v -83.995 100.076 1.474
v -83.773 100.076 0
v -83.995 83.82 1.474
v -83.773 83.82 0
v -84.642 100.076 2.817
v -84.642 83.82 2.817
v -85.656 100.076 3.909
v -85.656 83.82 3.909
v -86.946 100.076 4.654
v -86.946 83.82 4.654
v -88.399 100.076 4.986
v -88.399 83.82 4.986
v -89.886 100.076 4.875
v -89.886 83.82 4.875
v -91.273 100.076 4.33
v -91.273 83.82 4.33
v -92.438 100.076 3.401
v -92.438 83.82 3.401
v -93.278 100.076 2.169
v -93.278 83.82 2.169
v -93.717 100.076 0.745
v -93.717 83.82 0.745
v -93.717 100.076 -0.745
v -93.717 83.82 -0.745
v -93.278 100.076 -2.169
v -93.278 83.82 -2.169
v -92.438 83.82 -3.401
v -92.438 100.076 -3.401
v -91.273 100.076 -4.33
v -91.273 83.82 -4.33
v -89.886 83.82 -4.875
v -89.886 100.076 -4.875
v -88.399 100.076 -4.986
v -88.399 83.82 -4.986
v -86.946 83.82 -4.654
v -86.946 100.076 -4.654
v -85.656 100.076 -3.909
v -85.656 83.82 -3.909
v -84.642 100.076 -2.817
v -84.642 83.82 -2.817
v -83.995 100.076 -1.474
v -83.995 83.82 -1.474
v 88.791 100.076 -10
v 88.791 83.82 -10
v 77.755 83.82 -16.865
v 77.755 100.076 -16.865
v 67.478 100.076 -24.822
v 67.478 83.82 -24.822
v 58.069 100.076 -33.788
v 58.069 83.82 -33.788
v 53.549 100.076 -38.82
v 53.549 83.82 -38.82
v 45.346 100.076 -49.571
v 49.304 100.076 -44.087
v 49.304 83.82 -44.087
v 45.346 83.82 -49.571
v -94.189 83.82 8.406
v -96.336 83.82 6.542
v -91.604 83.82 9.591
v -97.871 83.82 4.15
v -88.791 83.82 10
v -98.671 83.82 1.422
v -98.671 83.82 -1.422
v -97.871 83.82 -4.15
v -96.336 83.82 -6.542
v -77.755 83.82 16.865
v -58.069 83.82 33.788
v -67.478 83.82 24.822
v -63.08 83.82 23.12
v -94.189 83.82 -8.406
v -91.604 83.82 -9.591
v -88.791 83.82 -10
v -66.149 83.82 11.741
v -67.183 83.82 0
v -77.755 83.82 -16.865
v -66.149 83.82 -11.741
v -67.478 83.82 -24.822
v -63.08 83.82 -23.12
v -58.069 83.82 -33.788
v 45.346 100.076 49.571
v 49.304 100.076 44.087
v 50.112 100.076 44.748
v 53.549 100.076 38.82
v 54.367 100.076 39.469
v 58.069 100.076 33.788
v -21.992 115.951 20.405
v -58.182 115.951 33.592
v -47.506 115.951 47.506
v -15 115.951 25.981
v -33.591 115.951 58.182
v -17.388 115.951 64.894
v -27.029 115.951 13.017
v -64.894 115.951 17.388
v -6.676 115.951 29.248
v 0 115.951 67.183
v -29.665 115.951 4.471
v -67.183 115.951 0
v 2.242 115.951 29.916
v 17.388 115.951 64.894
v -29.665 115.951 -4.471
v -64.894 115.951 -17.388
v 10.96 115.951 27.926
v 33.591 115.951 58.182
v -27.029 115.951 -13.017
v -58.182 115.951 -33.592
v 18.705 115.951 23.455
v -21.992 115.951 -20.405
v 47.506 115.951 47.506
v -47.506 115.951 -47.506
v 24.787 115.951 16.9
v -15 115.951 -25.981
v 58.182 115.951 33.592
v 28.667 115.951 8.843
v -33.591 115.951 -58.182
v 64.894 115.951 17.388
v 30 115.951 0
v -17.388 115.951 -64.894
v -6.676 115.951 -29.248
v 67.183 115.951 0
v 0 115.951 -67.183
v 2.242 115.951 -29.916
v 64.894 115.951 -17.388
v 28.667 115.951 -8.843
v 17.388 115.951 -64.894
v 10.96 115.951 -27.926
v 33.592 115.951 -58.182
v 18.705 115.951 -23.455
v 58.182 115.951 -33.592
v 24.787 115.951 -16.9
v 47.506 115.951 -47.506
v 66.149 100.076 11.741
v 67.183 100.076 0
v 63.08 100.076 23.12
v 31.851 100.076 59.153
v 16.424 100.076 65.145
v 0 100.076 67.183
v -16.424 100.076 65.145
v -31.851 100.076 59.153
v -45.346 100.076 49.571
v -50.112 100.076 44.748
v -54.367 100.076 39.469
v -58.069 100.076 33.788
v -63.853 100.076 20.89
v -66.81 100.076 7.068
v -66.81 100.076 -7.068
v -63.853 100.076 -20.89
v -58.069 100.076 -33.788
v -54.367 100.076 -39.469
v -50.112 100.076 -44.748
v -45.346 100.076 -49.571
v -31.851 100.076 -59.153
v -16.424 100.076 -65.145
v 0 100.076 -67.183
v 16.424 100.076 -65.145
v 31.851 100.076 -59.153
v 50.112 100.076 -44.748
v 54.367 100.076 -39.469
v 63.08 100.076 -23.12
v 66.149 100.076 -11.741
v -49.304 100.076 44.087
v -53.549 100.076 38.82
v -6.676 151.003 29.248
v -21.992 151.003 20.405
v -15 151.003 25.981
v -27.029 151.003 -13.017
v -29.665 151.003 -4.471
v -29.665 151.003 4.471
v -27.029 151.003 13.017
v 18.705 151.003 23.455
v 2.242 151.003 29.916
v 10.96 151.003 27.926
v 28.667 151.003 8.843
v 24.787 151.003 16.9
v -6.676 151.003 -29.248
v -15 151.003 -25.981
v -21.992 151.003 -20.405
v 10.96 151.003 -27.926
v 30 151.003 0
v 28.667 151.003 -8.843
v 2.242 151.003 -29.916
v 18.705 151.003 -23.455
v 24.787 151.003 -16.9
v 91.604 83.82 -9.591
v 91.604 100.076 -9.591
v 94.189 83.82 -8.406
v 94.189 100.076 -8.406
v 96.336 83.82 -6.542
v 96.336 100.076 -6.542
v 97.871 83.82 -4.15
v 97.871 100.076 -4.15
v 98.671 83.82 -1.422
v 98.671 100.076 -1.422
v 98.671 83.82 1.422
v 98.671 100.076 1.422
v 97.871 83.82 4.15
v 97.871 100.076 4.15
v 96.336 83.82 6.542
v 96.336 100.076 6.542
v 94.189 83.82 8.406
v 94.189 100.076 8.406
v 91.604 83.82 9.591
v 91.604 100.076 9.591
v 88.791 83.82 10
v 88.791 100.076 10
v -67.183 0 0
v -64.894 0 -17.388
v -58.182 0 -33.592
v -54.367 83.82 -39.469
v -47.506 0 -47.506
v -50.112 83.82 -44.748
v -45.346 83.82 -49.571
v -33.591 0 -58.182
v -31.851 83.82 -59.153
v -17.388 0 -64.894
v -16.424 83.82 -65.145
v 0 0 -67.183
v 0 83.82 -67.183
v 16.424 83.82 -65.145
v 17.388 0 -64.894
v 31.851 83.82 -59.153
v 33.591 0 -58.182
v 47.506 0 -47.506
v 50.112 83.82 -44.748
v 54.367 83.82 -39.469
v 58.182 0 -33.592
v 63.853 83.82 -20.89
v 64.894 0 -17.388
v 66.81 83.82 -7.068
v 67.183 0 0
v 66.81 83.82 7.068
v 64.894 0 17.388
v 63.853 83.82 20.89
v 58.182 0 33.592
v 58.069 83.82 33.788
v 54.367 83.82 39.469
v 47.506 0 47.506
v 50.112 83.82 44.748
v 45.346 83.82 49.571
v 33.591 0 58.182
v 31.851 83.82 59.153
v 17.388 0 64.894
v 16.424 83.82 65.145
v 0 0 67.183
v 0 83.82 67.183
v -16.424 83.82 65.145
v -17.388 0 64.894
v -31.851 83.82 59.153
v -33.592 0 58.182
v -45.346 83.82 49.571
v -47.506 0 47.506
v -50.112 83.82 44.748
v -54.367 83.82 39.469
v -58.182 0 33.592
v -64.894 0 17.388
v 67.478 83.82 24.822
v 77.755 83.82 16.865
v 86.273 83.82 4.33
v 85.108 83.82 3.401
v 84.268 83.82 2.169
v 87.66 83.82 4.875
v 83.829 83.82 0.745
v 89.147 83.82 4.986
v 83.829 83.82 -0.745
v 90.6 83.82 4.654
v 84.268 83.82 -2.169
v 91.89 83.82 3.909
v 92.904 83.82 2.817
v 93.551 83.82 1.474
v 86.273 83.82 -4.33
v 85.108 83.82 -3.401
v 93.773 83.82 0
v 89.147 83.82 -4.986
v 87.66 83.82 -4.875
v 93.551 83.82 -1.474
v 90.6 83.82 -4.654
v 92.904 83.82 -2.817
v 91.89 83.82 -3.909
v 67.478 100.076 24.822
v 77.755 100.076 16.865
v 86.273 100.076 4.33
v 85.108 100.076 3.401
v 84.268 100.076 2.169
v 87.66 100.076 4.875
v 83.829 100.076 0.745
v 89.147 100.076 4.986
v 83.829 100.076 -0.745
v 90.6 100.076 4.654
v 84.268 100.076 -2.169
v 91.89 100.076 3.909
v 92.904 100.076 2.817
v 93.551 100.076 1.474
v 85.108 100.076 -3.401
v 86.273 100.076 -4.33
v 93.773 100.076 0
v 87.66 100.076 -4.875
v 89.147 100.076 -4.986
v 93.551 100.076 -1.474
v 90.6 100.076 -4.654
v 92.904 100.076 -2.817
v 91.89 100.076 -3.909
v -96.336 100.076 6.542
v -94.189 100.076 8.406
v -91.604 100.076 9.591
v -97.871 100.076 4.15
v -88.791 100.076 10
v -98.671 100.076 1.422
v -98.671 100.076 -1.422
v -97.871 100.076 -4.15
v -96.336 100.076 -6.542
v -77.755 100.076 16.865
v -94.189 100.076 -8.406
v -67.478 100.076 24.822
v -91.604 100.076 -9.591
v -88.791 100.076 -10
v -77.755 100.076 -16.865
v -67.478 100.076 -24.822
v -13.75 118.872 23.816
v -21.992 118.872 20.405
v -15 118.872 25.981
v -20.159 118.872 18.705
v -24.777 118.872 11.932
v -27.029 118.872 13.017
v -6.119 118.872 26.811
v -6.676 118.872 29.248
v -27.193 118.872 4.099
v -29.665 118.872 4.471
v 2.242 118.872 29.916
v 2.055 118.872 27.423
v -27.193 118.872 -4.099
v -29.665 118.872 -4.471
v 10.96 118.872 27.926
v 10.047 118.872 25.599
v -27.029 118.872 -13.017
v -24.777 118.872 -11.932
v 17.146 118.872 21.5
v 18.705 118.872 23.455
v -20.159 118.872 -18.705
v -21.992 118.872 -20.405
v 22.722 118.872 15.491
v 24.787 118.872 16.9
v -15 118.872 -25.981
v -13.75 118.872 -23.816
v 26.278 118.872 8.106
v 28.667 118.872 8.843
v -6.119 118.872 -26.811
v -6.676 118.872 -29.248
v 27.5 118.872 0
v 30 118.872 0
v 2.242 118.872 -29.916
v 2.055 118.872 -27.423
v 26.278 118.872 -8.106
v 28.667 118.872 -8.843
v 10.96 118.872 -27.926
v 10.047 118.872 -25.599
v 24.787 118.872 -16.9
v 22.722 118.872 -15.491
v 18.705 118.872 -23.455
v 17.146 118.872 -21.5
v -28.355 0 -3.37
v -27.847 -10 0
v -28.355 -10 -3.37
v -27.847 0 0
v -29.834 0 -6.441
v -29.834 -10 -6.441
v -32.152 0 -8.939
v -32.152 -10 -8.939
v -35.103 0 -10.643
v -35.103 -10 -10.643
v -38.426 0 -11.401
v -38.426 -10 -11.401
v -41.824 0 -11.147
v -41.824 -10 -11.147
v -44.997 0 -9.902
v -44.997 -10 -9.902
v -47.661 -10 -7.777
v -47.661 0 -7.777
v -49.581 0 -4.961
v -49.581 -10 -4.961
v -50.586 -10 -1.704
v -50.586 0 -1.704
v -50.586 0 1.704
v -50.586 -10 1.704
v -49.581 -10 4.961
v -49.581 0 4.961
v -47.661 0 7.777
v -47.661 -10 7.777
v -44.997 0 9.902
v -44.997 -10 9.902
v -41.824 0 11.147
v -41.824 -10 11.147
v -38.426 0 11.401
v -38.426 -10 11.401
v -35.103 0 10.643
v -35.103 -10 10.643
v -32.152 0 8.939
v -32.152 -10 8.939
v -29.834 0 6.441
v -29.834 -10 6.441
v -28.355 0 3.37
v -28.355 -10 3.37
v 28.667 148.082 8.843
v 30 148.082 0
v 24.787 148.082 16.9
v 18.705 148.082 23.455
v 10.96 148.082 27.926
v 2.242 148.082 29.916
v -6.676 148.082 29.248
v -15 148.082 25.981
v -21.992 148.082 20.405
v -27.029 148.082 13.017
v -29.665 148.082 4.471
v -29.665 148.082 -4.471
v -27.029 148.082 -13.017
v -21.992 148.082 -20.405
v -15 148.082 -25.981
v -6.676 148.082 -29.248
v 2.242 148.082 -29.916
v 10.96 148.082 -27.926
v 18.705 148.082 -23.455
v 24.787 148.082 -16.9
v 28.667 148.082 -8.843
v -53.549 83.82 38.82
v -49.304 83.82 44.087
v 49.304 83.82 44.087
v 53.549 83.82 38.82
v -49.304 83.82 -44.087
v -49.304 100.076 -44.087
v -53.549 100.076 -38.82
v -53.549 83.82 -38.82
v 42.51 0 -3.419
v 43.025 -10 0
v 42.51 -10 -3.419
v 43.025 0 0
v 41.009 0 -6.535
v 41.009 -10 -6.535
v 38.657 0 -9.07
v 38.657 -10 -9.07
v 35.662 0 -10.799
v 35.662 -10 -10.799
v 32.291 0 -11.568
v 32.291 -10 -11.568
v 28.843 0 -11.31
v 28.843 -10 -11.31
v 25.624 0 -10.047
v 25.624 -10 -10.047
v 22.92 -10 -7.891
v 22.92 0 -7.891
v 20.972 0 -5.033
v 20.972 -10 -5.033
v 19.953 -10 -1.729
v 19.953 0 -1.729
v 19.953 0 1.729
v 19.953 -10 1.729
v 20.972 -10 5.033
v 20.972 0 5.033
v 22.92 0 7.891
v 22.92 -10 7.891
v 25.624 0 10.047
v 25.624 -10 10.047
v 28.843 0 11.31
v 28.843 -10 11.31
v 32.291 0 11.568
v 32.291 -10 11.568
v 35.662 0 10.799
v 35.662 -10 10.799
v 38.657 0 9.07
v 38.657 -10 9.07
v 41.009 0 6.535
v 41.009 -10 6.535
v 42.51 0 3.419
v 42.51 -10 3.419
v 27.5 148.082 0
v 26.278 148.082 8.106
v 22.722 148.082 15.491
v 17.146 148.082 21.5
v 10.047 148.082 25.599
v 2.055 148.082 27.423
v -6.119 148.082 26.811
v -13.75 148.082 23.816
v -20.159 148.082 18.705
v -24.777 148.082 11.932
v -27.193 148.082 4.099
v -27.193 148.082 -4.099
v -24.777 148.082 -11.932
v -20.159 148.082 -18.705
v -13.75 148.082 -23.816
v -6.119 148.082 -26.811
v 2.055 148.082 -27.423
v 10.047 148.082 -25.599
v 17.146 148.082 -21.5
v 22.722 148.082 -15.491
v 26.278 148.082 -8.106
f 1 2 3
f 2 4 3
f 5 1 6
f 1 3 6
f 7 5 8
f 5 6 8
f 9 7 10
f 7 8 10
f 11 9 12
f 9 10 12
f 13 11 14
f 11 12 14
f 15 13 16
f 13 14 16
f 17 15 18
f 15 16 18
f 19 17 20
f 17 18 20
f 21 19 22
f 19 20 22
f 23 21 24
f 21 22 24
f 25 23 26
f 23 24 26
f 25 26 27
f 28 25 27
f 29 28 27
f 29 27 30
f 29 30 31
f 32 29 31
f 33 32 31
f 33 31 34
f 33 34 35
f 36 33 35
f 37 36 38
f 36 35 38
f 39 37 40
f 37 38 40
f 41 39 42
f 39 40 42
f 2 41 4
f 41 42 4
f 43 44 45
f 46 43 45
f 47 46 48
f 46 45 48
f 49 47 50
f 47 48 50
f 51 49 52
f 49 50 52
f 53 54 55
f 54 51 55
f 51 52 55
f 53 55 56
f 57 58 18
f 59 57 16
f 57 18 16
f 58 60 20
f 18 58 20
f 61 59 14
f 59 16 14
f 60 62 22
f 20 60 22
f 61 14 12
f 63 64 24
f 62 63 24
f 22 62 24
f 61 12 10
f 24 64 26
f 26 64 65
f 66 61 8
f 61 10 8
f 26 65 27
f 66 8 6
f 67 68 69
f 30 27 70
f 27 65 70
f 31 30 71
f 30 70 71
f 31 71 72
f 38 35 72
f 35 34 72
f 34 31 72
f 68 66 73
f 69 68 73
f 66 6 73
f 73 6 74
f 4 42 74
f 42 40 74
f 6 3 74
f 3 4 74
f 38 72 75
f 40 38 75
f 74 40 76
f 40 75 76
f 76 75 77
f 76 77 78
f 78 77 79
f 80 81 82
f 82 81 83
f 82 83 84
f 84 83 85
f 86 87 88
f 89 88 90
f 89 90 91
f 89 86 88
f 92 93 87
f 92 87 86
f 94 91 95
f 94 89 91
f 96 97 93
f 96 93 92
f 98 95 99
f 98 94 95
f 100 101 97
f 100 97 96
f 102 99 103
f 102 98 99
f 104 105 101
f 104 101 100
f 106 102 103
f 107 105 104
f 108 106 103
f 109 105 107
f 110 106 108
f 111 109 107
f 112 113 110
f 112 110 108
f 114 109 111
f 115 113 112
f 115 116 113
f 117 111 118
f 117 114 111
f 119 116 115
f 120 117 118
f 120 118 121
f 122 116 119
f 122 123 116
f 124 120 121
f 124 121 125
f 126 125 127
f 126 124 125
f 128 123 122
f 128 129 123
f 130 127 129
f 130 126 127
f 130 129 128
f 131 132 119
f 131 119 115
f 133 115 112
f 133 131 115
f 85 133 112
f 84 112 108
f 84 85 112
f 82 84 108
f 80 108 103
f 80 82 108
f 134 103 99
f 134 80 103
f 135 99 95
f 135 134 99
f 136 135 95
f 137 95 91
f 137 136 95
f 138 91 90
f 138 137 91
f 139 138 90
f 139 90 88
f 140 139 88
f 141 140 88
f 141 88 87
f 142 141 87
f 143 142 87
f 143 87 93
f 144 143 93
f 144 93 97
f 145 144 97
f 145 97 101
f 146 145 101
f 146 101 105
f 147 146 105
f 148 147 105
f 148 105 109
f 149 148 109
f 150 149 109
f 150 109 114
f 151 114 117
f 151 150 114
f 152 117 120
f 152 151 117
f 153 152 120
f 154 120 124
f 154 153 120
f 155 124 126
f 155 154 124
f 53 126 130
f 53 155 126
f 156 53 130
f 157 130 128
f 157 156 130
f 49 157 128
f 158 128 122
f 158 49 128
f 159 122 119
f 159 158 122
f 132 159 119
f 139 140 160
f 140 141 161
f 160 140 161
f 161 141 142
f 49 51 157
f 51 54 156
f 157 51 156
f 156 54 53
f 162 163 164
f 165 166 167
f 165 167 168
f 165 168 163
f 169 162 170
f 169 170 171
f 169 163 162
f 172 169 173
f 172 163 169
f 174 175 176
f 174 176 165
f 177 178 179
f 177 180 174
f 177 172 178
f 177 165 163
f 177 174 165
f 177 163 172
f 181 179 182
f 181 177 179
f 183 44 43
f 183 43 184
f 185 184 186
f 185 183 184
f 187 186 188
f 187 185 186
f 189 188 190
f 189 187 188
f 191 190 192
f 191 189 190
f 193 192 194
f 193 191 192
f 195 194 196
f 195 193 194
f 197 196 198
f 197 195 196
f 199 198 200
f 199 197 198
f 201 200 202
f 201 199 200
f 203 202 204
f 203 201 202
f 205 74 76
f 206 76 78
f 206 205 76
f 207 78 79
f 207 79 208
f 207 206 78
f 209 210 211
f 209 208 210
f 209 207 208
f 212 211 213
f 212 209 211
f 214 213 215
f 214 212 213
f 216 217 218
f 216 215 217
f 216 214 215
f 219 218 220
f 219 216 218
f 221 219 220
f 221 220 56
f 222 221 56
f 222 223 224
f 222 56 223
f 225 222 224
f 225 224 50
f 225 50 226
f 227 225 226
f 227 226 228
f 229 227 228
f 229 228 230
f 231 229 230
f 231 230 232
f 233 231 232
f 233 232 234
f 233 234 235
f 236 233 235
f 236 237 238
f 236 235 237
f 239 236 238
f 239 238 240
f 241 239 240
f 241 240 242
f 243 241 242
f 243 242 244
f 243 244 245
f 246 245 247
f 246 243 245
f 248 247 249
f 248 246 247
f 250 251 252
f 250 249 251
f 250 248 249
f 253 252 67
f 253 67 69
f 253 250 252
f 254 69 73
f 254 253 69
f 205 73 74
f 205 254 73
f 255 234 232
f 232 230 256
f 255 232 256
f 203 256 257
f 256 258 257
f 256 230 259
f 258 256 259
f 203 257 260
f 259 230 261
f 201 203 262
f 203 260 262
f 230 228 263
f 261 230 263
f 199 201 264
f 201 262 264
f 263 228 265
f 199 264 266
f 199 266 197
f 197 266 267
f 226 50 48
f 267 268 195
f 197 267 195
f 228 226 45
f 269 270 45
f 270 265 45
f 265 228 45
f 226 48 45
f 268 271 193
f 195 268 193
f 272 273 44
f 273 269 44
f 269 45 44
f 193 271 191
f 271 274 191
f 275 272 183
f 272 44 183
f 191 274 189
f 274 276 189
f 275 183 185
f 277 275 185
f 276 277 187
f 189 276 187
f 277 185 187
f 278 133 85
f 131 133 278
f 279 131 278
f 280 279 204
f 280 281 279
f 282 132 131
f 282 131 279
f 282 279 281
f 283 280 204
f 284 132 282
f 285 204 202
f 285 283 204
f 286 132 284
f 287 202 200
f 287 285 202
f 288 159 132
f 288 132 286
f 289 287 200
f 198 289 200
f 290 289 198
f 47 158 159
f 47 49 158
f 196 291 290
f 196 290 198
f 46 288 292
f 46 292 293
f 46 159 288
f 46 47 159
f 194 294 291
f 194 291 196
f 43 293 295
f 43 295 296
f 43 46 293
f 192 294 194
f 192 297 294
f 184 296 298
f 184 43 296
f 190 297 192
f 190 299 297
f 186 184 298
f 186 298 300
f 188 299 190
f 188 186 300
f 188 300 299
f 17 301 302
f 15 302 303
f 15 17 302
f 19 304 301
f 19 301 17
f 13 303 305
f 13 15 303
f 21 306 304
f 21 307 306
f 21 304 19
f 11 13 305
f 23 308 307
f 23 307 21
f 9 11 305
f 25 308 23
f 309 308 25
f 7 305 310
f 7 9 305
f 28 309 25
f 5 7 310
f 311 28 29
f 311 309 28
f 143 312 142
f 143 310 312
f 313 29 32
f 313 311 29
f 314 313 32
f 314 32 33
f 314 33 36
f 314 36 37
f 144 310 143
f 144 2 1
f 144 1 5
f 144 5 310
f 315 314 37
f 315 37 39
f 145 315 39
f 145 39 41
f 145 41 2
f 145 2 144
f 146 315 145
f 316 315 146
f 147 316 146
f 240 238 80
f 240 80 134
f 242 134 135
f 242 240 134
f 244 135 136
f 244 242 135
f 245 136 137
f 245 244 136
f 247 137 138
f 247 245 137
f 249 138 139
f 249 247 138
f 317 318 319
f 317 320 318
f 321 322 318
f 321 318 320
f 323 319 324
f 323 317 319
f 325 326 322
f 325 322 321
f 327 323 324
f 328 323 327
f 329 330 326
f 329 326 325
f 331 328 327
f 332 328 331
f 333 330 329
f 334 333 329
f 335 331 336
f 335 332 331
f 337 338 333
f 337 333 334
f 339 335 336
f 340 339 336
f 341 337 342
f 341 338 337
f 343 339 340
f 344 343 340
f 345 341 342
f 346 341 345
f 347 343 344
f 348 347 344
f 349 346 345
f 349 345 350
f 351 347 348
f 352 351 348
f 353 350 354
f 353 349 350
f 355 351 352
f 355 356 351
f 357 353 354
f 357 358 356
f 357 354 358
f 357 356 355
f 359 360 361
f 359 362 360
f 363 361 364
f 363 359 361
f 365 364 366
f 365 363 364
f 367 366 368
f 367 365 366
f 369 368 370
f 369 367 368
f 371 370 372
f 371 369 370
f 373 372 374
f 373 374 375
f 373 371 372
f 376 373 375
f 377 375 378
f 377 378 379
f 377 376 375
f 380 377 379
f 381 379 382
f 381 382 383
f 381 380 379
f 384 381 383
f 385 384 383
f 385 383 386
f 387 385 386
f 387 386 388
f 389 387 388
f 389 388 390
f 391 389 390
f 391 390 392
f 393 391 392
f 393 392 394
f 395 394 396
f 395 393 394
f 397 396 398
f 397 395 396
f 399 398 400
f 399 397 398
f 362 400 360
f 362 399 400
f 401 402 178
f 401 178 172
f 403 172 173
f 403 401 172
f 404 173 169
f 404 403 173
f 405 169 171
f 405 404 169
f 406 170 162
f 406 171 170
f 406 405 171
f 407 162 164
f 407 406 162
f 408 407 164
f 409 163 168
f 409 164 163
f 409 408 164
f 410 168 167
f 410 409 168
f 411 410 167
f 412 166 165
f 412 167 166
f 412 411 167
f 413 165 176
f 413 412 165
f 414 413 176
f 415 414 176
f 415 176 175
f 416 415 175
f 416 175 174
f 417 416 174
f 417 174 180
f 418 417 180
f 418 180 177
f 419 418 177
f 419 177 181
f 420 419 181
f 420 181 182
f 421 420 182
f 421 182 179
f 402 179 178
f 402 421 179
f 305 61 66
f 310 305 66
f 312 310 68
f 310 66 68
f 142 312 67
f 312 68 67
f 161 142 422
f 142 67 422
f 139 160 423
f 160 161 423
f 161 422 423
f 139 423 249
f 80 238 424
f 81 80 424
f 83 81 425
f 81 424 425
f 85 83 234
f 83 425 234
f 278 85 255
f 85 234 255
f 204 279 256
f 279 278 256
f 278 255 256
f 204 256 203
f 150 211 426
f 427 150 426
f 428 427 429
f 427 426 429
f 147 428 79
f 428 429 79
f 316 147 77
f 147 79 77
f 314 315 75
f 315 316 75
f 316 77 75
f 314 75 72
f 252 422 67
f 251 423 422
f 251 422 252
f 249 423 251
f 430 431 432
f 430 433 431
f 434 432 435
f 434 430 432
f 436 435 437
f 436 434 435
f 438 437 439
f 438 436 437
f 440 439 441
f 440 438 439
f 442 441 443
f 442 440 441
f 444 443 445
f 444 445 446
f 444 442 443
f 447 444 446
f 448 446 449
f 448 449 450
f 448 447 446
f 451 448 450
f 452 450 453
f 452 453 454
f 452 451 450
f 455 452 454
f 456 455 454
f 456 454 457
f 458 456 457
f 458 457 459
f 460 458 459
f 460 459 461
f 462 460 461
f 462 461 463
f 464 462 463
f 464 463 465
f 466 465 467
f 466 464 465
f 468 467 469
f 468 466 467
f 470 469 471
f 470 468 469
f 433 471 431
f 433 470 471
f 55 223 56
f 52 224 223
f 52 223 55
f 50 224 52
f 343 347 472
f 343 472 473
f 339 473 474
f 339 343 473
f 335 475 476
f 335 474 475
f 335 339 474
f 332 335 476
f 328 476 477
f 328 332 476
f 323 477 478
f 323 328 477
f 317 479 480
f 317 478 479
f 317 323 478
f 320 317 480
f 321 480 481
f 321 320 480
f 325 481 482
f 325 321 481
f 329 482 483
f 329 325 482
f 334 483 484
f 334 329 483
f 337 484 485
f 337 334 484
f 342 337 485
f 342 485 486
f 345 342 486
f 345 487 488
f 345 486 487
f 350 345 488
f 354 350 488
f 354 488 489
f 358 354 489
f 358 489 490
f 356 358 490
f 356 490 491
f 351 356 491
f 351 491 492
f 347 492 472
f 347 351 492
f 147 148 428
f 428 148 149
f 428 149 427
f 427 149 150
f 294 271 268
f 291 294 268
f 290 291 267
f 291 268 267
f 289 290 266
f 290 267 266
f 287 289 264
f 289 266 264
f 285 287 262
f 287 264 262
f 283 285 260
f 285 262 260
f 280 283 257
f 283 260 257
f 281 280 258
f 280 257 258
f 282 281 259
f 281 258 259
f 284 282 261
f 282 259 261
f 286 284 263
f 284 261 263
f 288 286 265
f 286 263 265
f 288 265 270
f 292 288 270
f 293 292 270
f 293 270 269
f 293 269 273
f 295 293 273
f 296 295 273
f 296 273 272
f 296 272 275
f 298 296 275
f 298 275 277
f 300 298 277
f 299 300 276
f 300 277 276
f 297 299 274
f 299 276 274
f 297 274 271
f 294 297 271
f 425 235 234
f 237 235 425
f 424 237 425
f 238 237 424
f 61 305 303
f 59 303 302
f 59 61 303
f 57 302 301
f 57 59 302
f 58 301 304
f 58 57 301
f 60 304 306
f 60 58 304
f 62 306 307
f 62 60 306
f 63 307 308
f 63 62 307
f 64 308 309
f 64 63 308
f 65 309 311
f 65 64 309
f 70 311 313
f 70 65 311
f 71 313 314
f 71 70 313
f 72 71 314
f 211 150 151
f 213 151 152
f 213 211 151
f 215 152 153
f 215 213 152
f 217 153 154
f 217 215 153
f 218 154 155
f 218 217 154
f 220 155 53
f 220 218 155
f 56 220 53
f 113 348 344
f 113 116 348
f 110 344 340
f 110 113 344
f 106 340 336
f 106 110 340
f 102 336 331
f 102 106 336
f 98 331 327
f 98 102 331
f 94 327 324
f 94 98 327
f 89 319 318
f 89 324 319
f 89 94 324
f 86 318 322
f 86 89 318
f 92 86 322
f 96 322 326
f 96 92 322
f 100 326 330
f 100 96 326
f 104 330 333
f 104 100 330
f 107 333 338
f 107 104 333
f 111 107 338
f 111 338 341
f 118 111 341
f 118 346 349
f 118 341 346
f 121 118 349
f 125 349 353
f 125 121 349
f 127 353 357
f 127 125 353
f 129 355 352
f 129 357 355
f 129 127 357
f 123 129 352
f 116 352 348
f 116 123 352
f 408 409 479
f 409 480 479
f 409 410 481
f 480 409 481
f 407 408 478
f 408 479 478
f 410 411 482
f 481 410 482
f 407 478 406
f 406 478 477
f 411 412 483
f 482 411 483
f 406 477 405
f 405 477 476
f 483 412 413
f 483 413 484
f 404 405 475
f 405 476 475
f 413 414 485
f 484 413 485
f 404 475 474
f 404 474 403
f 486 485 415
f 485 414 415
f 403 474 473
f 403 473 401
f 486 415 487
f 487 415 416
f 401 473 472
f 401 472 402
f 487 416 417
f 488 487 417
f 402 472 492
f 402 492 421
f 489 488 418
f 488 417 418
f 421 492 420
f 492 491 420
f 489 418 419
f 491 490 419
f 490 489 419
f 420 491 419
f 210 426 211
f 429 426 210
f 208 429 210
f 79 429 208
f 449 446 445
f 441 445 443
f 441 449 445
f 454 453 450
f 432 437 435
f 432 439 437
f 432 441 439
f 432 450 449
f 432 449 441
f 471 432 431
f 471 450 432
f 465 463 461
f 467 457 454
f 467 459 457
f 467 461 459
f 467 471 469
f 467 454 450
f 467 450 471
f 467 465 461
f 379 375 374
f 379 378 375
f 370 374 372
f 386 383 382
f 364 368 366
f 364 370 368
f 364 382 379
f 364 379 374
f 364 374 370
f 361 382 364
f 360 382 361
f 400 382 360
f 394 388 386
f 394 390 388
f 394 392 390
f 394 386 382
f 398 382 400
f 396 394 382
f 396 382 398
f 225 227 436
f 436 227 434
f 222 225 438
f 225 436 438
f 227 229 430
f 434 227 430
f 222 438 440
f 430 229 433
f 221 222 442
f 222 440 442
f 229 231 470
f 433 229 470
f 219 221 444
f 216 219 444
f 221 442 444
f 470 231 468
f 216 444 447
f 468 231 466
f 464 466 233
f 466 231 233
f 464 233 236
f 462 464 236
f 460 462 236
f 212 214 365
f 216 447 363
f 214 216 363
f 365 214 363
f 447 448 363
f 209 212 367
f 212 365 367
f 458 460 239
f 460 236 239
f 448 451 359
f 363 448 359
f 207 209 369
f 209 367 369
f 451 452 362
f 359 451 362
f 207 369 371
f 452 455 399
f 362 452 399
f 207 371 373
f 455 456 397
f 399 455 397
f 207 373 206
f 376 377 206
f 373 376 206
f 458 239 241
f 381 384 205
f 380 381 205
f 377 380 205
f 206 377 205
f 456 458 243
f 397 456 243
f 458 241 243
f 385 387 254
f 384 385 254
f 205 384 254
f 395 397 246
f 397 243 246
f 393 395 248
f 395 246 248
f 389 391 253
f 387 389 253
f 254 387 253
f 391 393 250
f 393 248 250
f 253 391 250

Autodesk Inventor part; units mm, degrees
ref_plane "YZ Plane" through (0, 0, 0) normal (1, 0, 0) x (0, 1, 0)
ref_plane "XZ Plane" through (0, 0, 0) normal (0, 1, 0) x (-1, 0, 0)
ref_plane "XY Plane" through (0, 0, 0) normal (0, 0, 1) x (1, 0, 0)
sketch "Sketch1" plane through (0, 0, 0) normal (0, 1, 0) x (-1, 0, 0)
  circle A0 centre (0, 0) radius 67.183
  dimension "d0" = 134.366
extrude "Extrusion1" add sketch "Sketch1" along normal blind 83.82
sketch "Sketch2" plane through (0, 83.82, 0) normal (0, 1, 0) x (1, 0, 0)
  arc A0 (-88.791, 10) -> (-88.791, -10) centre (-88.773, 0) ccw
  line L0 (0, 169.5617) -> (0, -169.5617) projected
  arc A1 (88.791, -10) -> (88.791, 10) centre (88.773, 0) ccw
  arc A2 (-45.3457, -49.5714) -> (-88.791, -10) centre (-150.2545, -121.1155) ccw
  line L1 (-210.3564, 0) -> (210.3564, 0) projected
  arc A3 (-88.791, 10) -> (-45.3457, 49.5714) centre (-150.2545, 121.1155) ccw
  arc A4 (88.791, -10) -> (45.3457, -49.5714) centre (150.2545, -121.1155) ccw
  arc A5 (45.3457, 49.5714) -> (88.791, 10) centre (150.2545, 121.1155) ccw
  circle A6 centre (88.773, 0) radius 5
  circle A7 centre (-88.773, 0) radius 5
  arc A8 (-45.3457, -49.5714) -> (45.3457, -49.5714) centre (0, 0) ccw
  arc A9 (45.3457, 49.5714) -> (-45.3457, 49.5714) centre (0, 0) ccw
  dimension "d4" = 88.773
  dimension "d5" = 20
  dimension "d6" = 10
  dimension "d7" = 10
extrude "Extrusion2" add sketch "Sketch2" along normal blind 16.256 contours A3 A9 L0 L1 A7 A0 | L1 A7 L0 A8 A2 A0 | A9 A5 A1 L1 A6 L0 | L1 A6 A1 A4 A8 L0
sketch "Sketch3" plane through (0, 0, 0) normal (0, -1, 0) x (1, 0, 0)
  circle A0 centre (0, 0) radius 67.183 projected
  circle A1 centre (-39.2802, 0) radius 11.4333
  circle A2 centre (31.4242, 0) radius 11.6008
  line L0 (-138.2822, 0) -> (138.2822, 0) projected
  line L1 (0, -94.0562) -> (0, 94.0562) projected
extrude "Extrusion3" add sketch "Sketch3" along normal blind 10 contours L0 A2 | A2 L0 | L0 A1 | A1 L0
sketch "Sketch4" plane through (0, 100.076, 0) normal (0, 1, 0) x (1, 0, 0)
  circle A0 centre (0, 0) radius 67.183
  dimension "d12" = 134.366
extrude "Extrusion4" add sketch "Sketch4" along normal blind 15.875
sketch "Sketch5" plane through (0, 115.951, 0) normal (0, 1, 0) x (1, 0, 0)
  circle A0 centre (0, 0) radius 30
  dimension "d17" = 60
extrude "Extrusion5" add sketch "Sketch5" along normal blind 2.921
sketch "Sketch6" plane through (0, 118.872, 0) normal (0, 1, 0) x (1, 0, 0)
  circle A0 centre (0, 0) radius 27.5
  dimension "d18" = 55
extrude "Extrusion6" add sketch "Sketch6" along normal blind 29.21
sketch "Sketch7" plane through (0, 148.082, 0) normal (0, 1, 0) x (1, 0, 0)
  circle A0 centre (0, 0) radius 30
  dimension "d21" = 60
extrude "Extrusion7" add sketch "Sketch7" along normal blind 2.921
properties part number "alternator"
